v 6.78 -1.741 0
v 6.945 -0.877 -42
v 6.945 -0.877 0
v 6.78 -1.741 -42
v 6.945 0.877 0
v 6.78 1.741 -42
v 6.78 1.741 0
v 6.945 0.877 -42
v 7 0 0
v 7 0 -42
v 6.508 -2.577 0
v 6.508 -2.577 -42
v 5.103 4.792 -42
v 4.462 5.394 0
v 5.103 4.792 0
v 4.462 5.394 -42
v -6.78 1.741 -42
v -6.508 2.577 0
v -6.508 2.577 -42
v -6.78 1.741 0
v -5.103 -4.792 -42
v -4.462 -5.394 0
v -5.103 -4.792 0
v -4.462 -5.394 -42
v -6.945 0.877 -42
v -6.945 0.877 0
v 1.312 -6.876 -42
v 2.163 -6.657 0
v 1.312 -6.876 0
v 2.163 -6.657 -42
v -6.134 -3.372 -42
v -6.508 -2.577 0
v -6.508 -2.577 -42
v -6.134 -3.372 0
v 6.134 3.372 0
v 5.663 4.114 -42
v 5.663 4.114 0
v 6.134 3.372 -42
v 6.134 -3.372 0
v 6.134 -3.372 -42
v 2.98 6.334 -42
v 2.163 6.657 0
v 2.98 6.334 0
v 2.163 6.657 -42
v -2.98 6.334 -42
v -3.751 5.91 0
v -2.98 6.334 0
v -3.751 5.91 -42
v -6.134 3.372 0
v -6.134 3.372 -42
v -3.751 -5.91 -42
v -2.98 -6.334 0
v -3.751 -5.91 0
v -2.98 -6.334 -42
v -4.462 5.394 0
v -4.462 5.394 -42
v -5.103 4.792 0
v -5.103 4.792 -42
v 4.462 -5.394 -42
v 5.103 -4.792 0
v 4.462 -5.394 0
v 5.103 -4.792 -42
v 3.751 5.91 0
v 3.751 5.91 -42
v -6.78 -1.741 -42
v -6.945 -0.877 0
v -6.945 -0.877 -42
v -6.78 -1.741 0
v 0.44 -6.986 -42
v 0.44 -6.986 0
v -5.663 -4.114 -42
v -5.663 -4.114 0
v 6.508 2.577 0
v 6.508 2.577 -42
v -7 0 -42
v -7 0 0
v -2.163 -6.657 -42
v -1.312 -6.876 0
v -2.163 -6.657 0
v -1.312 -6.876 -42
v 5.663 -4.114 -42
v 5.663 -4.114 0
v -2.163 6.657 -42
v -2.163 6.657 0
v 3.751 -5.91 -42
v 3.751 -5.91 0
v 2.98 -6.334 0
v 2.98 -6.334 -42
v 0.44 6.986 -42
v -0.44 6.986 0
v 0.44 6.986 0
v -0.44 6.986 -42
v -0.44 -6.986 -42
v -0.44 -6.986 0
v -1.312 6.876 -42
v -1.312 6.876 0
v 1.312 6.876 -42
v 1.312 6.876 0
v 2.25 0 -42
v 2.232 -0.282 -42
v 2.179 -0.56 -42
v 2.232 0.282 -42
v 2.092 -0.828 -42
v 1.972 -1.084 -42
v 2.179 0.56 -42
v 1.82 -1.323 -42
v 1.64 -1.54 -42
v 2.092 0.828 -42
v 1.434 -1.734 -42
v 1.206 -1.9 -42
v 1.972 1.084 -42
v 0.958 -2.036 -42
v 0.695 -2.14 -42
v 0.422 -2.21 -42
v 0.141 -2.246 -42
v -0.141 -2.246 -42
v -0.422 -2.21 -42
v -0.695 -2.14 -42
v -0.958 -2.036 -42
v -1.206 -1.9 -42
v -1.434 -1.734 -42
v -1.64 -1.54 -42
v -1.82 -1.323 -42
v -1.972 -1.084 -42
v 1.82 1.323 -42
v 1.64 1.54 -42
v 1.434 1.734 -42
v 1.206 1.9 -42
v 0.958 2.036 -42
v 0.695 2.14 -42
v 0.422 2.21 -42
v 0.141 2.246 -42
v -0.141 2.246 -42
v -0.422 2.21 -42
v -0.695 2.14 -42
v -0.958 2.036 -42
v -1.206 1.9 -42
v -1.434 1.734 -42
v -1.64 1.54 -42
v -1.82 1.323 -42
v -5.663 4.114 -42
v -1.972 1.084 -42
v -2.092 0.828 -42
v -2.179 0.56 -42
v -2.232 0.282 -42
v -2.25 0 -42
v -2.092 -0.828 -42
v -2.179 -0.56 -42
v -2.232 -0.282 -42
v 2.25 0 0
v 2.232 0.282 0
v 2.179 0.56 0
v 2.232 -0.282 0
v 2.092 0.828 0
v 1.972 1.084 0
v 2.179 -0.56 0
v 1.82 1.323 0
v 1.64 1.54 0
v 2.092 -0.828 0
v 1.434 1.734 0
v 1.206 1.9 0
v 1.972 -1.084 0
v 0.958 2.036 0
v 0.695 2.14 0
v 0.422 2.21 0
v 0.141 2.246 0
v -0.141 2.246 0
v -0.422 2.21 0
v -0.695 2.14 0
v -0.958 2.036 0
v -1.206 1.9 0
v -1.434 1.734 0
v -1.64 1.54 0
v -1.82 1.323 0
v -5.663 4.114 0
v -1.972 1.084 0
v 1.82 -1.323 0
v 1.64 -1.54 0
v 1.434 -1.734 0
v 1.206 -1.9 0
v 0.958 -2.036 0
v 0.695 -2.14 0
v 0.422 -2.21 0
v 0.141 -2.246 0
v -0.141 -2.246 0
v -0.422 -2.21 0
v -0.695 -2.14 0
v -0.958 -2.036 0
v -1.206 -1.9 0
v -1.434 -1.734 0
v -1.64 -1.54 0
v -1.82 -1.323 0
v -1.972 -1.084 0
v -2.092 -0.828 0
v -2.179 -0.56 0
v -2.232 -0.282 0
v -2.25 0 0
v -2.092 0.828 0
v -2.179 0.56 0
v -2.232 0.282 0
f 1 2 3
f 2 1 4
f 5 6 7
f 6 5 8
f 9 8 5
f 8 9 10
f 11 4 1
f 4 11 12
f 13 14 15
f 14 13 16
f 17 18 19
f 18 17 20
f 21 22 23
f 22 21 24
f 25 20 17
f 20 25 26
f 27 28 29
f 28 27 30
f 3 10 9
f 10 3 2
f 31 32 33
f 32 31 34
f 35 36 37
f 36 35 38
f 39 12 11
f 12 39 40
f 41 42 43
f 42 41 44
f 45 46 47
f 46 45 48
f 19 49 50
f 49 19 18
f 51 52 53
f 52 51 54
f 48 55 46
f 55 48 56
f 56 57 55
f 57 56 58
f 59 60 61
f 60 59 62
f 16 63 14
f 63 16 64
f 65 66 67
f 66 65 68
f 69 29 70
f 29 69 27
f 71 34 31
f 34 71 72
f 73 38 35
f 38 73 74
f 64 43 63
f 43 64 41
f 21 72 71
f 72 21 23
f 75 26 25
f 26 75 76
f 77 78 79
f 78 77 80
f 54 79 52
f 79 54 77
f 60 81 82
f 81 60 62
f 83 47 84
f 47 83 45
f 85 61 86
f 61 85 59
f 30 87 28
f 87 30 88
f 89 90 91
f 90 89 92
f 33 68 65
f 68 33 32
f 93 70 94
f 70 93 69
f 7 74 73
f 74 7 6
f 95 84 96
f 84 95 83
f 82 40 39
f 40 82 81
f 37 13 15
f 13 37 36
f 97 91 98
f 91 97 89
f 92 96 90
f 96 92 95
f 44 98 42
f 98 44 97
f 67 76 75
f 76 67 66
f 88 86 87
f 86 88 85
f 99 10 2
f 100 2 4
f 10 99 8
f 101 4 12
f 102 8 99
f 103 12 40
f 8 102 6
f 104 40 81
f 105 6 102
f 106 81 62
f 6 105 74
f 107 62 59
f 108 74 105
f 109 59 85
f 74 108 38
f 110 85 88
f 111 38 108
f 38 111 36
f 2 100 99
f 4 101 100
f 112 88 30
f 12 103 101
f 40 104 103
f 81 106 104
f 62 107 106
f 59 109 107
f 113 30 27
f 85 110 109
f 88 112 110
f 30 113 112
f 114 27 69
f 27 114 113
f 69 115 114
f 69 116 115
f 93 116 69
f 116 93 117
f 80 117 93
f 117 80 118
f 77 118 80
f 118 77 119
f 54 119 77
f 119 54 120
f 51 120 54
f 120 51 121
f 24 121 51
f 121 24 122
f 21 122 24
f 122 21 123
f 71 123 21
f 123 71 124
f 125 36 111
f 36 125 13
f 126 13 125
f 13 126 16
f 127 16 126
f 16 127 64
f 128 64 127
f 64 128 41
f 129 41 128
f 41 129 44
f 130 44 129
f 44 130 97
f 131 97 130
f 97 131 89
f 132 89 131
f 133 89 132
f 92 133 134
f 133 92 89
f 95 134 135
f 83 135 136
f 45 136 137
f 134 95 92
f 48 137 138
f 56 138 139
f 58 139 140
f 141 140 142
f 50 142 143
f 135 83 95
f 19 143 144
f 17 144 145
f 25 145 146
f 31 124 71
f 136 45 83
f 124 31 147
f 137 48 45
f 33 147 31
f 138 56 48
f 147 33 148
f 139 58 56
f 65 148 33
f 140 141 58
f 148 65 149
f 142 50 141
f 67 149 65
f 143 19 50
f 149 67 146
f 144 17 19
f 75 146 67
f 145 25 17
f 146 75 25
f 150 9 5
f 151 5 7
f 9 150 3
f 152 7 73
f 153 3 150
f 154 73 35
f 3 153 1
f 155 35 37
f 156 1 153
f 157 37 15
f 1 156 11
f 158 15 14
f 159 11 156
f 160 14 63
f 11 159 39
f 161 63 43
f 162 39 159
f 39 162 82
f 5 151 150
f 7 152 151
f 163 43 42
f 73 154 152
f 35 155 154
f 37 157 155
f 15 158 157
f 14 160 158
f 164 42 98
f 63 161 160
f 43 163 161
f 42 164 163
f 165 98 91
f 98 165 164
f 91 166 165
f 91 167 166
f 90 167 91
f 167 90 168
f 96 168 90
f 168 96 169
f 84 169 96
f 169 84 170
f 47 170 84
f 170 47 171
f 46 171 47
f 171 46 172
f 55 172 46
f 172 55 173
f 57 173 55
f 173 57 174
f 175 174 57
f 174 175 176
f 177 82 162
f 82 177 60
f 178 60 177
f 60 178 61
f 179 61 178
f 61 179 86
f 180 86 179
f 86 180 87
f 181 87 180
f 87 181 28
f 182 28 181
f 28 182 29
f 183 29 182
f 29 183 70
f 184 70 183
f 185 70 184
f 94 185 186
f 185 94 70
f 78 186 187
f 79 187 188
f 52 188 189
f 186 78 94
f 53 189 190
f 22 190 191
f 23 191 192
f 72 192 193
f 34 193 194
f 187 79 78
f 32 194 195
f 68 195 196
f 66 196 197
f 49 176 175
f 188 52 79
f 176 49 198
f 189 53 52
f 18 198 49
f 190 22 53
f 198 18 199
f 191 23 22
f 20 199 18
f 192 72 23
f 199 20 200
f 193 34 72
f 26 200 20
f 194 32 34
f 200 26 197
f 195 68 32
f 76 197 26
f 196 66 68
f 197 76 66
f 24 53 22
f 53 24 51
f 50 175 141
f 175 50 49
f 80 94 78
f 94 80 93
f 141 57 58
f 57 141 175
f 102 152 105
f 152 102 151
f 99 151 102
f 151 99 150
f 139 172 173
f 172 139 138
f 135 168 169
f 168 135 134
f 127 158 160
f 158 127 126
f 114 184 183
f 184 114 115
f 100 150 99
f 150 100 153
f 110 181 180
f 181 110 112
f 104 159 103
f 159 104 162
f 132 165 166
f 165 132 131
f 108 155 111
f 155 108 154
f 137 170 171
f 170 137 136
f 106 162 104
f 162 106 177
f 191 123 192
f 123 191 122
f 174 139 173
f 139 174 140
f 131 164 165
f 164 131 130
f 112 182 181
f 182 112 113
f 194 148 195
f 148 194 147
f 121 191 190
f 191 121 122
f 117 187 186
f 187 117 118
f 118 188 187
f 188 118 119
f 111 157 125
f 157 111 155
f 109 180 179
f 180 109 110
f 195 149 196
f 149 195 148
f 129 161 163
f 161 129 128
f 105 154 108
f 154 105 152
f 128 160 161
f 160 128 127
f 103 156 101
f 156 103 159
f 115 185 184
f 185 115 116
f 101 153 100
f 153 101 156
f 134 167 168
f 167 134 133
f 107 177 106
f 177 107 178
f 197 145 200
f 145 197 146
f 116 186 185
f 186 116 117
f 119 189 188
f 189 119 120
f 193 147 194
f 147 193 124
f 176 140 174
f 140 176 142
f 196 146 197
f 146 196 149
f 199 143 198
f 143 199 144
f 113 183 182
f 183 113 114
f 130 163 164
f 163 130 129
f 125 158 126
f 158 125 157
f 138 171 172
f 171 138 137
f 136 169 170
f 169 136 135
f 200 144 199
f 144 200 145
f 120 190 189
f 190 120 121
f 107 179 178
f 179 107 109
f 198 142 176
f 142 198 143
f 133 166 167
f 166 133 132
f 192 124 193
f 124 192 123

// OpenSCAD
$fn = 50;


difference() {
	union() {
		translate(v = [0, 0, -42.0000000000]) {
			cylinder(h = 42, r = 7.0000000000);
		}
		cylinder(h = 0, r = 10.0000000000);
	}
	union() {
		#translate(v = [0, 0, -42]) {
			cylinder(h = 42, r = 2.2500000000);
		}
	}
}
